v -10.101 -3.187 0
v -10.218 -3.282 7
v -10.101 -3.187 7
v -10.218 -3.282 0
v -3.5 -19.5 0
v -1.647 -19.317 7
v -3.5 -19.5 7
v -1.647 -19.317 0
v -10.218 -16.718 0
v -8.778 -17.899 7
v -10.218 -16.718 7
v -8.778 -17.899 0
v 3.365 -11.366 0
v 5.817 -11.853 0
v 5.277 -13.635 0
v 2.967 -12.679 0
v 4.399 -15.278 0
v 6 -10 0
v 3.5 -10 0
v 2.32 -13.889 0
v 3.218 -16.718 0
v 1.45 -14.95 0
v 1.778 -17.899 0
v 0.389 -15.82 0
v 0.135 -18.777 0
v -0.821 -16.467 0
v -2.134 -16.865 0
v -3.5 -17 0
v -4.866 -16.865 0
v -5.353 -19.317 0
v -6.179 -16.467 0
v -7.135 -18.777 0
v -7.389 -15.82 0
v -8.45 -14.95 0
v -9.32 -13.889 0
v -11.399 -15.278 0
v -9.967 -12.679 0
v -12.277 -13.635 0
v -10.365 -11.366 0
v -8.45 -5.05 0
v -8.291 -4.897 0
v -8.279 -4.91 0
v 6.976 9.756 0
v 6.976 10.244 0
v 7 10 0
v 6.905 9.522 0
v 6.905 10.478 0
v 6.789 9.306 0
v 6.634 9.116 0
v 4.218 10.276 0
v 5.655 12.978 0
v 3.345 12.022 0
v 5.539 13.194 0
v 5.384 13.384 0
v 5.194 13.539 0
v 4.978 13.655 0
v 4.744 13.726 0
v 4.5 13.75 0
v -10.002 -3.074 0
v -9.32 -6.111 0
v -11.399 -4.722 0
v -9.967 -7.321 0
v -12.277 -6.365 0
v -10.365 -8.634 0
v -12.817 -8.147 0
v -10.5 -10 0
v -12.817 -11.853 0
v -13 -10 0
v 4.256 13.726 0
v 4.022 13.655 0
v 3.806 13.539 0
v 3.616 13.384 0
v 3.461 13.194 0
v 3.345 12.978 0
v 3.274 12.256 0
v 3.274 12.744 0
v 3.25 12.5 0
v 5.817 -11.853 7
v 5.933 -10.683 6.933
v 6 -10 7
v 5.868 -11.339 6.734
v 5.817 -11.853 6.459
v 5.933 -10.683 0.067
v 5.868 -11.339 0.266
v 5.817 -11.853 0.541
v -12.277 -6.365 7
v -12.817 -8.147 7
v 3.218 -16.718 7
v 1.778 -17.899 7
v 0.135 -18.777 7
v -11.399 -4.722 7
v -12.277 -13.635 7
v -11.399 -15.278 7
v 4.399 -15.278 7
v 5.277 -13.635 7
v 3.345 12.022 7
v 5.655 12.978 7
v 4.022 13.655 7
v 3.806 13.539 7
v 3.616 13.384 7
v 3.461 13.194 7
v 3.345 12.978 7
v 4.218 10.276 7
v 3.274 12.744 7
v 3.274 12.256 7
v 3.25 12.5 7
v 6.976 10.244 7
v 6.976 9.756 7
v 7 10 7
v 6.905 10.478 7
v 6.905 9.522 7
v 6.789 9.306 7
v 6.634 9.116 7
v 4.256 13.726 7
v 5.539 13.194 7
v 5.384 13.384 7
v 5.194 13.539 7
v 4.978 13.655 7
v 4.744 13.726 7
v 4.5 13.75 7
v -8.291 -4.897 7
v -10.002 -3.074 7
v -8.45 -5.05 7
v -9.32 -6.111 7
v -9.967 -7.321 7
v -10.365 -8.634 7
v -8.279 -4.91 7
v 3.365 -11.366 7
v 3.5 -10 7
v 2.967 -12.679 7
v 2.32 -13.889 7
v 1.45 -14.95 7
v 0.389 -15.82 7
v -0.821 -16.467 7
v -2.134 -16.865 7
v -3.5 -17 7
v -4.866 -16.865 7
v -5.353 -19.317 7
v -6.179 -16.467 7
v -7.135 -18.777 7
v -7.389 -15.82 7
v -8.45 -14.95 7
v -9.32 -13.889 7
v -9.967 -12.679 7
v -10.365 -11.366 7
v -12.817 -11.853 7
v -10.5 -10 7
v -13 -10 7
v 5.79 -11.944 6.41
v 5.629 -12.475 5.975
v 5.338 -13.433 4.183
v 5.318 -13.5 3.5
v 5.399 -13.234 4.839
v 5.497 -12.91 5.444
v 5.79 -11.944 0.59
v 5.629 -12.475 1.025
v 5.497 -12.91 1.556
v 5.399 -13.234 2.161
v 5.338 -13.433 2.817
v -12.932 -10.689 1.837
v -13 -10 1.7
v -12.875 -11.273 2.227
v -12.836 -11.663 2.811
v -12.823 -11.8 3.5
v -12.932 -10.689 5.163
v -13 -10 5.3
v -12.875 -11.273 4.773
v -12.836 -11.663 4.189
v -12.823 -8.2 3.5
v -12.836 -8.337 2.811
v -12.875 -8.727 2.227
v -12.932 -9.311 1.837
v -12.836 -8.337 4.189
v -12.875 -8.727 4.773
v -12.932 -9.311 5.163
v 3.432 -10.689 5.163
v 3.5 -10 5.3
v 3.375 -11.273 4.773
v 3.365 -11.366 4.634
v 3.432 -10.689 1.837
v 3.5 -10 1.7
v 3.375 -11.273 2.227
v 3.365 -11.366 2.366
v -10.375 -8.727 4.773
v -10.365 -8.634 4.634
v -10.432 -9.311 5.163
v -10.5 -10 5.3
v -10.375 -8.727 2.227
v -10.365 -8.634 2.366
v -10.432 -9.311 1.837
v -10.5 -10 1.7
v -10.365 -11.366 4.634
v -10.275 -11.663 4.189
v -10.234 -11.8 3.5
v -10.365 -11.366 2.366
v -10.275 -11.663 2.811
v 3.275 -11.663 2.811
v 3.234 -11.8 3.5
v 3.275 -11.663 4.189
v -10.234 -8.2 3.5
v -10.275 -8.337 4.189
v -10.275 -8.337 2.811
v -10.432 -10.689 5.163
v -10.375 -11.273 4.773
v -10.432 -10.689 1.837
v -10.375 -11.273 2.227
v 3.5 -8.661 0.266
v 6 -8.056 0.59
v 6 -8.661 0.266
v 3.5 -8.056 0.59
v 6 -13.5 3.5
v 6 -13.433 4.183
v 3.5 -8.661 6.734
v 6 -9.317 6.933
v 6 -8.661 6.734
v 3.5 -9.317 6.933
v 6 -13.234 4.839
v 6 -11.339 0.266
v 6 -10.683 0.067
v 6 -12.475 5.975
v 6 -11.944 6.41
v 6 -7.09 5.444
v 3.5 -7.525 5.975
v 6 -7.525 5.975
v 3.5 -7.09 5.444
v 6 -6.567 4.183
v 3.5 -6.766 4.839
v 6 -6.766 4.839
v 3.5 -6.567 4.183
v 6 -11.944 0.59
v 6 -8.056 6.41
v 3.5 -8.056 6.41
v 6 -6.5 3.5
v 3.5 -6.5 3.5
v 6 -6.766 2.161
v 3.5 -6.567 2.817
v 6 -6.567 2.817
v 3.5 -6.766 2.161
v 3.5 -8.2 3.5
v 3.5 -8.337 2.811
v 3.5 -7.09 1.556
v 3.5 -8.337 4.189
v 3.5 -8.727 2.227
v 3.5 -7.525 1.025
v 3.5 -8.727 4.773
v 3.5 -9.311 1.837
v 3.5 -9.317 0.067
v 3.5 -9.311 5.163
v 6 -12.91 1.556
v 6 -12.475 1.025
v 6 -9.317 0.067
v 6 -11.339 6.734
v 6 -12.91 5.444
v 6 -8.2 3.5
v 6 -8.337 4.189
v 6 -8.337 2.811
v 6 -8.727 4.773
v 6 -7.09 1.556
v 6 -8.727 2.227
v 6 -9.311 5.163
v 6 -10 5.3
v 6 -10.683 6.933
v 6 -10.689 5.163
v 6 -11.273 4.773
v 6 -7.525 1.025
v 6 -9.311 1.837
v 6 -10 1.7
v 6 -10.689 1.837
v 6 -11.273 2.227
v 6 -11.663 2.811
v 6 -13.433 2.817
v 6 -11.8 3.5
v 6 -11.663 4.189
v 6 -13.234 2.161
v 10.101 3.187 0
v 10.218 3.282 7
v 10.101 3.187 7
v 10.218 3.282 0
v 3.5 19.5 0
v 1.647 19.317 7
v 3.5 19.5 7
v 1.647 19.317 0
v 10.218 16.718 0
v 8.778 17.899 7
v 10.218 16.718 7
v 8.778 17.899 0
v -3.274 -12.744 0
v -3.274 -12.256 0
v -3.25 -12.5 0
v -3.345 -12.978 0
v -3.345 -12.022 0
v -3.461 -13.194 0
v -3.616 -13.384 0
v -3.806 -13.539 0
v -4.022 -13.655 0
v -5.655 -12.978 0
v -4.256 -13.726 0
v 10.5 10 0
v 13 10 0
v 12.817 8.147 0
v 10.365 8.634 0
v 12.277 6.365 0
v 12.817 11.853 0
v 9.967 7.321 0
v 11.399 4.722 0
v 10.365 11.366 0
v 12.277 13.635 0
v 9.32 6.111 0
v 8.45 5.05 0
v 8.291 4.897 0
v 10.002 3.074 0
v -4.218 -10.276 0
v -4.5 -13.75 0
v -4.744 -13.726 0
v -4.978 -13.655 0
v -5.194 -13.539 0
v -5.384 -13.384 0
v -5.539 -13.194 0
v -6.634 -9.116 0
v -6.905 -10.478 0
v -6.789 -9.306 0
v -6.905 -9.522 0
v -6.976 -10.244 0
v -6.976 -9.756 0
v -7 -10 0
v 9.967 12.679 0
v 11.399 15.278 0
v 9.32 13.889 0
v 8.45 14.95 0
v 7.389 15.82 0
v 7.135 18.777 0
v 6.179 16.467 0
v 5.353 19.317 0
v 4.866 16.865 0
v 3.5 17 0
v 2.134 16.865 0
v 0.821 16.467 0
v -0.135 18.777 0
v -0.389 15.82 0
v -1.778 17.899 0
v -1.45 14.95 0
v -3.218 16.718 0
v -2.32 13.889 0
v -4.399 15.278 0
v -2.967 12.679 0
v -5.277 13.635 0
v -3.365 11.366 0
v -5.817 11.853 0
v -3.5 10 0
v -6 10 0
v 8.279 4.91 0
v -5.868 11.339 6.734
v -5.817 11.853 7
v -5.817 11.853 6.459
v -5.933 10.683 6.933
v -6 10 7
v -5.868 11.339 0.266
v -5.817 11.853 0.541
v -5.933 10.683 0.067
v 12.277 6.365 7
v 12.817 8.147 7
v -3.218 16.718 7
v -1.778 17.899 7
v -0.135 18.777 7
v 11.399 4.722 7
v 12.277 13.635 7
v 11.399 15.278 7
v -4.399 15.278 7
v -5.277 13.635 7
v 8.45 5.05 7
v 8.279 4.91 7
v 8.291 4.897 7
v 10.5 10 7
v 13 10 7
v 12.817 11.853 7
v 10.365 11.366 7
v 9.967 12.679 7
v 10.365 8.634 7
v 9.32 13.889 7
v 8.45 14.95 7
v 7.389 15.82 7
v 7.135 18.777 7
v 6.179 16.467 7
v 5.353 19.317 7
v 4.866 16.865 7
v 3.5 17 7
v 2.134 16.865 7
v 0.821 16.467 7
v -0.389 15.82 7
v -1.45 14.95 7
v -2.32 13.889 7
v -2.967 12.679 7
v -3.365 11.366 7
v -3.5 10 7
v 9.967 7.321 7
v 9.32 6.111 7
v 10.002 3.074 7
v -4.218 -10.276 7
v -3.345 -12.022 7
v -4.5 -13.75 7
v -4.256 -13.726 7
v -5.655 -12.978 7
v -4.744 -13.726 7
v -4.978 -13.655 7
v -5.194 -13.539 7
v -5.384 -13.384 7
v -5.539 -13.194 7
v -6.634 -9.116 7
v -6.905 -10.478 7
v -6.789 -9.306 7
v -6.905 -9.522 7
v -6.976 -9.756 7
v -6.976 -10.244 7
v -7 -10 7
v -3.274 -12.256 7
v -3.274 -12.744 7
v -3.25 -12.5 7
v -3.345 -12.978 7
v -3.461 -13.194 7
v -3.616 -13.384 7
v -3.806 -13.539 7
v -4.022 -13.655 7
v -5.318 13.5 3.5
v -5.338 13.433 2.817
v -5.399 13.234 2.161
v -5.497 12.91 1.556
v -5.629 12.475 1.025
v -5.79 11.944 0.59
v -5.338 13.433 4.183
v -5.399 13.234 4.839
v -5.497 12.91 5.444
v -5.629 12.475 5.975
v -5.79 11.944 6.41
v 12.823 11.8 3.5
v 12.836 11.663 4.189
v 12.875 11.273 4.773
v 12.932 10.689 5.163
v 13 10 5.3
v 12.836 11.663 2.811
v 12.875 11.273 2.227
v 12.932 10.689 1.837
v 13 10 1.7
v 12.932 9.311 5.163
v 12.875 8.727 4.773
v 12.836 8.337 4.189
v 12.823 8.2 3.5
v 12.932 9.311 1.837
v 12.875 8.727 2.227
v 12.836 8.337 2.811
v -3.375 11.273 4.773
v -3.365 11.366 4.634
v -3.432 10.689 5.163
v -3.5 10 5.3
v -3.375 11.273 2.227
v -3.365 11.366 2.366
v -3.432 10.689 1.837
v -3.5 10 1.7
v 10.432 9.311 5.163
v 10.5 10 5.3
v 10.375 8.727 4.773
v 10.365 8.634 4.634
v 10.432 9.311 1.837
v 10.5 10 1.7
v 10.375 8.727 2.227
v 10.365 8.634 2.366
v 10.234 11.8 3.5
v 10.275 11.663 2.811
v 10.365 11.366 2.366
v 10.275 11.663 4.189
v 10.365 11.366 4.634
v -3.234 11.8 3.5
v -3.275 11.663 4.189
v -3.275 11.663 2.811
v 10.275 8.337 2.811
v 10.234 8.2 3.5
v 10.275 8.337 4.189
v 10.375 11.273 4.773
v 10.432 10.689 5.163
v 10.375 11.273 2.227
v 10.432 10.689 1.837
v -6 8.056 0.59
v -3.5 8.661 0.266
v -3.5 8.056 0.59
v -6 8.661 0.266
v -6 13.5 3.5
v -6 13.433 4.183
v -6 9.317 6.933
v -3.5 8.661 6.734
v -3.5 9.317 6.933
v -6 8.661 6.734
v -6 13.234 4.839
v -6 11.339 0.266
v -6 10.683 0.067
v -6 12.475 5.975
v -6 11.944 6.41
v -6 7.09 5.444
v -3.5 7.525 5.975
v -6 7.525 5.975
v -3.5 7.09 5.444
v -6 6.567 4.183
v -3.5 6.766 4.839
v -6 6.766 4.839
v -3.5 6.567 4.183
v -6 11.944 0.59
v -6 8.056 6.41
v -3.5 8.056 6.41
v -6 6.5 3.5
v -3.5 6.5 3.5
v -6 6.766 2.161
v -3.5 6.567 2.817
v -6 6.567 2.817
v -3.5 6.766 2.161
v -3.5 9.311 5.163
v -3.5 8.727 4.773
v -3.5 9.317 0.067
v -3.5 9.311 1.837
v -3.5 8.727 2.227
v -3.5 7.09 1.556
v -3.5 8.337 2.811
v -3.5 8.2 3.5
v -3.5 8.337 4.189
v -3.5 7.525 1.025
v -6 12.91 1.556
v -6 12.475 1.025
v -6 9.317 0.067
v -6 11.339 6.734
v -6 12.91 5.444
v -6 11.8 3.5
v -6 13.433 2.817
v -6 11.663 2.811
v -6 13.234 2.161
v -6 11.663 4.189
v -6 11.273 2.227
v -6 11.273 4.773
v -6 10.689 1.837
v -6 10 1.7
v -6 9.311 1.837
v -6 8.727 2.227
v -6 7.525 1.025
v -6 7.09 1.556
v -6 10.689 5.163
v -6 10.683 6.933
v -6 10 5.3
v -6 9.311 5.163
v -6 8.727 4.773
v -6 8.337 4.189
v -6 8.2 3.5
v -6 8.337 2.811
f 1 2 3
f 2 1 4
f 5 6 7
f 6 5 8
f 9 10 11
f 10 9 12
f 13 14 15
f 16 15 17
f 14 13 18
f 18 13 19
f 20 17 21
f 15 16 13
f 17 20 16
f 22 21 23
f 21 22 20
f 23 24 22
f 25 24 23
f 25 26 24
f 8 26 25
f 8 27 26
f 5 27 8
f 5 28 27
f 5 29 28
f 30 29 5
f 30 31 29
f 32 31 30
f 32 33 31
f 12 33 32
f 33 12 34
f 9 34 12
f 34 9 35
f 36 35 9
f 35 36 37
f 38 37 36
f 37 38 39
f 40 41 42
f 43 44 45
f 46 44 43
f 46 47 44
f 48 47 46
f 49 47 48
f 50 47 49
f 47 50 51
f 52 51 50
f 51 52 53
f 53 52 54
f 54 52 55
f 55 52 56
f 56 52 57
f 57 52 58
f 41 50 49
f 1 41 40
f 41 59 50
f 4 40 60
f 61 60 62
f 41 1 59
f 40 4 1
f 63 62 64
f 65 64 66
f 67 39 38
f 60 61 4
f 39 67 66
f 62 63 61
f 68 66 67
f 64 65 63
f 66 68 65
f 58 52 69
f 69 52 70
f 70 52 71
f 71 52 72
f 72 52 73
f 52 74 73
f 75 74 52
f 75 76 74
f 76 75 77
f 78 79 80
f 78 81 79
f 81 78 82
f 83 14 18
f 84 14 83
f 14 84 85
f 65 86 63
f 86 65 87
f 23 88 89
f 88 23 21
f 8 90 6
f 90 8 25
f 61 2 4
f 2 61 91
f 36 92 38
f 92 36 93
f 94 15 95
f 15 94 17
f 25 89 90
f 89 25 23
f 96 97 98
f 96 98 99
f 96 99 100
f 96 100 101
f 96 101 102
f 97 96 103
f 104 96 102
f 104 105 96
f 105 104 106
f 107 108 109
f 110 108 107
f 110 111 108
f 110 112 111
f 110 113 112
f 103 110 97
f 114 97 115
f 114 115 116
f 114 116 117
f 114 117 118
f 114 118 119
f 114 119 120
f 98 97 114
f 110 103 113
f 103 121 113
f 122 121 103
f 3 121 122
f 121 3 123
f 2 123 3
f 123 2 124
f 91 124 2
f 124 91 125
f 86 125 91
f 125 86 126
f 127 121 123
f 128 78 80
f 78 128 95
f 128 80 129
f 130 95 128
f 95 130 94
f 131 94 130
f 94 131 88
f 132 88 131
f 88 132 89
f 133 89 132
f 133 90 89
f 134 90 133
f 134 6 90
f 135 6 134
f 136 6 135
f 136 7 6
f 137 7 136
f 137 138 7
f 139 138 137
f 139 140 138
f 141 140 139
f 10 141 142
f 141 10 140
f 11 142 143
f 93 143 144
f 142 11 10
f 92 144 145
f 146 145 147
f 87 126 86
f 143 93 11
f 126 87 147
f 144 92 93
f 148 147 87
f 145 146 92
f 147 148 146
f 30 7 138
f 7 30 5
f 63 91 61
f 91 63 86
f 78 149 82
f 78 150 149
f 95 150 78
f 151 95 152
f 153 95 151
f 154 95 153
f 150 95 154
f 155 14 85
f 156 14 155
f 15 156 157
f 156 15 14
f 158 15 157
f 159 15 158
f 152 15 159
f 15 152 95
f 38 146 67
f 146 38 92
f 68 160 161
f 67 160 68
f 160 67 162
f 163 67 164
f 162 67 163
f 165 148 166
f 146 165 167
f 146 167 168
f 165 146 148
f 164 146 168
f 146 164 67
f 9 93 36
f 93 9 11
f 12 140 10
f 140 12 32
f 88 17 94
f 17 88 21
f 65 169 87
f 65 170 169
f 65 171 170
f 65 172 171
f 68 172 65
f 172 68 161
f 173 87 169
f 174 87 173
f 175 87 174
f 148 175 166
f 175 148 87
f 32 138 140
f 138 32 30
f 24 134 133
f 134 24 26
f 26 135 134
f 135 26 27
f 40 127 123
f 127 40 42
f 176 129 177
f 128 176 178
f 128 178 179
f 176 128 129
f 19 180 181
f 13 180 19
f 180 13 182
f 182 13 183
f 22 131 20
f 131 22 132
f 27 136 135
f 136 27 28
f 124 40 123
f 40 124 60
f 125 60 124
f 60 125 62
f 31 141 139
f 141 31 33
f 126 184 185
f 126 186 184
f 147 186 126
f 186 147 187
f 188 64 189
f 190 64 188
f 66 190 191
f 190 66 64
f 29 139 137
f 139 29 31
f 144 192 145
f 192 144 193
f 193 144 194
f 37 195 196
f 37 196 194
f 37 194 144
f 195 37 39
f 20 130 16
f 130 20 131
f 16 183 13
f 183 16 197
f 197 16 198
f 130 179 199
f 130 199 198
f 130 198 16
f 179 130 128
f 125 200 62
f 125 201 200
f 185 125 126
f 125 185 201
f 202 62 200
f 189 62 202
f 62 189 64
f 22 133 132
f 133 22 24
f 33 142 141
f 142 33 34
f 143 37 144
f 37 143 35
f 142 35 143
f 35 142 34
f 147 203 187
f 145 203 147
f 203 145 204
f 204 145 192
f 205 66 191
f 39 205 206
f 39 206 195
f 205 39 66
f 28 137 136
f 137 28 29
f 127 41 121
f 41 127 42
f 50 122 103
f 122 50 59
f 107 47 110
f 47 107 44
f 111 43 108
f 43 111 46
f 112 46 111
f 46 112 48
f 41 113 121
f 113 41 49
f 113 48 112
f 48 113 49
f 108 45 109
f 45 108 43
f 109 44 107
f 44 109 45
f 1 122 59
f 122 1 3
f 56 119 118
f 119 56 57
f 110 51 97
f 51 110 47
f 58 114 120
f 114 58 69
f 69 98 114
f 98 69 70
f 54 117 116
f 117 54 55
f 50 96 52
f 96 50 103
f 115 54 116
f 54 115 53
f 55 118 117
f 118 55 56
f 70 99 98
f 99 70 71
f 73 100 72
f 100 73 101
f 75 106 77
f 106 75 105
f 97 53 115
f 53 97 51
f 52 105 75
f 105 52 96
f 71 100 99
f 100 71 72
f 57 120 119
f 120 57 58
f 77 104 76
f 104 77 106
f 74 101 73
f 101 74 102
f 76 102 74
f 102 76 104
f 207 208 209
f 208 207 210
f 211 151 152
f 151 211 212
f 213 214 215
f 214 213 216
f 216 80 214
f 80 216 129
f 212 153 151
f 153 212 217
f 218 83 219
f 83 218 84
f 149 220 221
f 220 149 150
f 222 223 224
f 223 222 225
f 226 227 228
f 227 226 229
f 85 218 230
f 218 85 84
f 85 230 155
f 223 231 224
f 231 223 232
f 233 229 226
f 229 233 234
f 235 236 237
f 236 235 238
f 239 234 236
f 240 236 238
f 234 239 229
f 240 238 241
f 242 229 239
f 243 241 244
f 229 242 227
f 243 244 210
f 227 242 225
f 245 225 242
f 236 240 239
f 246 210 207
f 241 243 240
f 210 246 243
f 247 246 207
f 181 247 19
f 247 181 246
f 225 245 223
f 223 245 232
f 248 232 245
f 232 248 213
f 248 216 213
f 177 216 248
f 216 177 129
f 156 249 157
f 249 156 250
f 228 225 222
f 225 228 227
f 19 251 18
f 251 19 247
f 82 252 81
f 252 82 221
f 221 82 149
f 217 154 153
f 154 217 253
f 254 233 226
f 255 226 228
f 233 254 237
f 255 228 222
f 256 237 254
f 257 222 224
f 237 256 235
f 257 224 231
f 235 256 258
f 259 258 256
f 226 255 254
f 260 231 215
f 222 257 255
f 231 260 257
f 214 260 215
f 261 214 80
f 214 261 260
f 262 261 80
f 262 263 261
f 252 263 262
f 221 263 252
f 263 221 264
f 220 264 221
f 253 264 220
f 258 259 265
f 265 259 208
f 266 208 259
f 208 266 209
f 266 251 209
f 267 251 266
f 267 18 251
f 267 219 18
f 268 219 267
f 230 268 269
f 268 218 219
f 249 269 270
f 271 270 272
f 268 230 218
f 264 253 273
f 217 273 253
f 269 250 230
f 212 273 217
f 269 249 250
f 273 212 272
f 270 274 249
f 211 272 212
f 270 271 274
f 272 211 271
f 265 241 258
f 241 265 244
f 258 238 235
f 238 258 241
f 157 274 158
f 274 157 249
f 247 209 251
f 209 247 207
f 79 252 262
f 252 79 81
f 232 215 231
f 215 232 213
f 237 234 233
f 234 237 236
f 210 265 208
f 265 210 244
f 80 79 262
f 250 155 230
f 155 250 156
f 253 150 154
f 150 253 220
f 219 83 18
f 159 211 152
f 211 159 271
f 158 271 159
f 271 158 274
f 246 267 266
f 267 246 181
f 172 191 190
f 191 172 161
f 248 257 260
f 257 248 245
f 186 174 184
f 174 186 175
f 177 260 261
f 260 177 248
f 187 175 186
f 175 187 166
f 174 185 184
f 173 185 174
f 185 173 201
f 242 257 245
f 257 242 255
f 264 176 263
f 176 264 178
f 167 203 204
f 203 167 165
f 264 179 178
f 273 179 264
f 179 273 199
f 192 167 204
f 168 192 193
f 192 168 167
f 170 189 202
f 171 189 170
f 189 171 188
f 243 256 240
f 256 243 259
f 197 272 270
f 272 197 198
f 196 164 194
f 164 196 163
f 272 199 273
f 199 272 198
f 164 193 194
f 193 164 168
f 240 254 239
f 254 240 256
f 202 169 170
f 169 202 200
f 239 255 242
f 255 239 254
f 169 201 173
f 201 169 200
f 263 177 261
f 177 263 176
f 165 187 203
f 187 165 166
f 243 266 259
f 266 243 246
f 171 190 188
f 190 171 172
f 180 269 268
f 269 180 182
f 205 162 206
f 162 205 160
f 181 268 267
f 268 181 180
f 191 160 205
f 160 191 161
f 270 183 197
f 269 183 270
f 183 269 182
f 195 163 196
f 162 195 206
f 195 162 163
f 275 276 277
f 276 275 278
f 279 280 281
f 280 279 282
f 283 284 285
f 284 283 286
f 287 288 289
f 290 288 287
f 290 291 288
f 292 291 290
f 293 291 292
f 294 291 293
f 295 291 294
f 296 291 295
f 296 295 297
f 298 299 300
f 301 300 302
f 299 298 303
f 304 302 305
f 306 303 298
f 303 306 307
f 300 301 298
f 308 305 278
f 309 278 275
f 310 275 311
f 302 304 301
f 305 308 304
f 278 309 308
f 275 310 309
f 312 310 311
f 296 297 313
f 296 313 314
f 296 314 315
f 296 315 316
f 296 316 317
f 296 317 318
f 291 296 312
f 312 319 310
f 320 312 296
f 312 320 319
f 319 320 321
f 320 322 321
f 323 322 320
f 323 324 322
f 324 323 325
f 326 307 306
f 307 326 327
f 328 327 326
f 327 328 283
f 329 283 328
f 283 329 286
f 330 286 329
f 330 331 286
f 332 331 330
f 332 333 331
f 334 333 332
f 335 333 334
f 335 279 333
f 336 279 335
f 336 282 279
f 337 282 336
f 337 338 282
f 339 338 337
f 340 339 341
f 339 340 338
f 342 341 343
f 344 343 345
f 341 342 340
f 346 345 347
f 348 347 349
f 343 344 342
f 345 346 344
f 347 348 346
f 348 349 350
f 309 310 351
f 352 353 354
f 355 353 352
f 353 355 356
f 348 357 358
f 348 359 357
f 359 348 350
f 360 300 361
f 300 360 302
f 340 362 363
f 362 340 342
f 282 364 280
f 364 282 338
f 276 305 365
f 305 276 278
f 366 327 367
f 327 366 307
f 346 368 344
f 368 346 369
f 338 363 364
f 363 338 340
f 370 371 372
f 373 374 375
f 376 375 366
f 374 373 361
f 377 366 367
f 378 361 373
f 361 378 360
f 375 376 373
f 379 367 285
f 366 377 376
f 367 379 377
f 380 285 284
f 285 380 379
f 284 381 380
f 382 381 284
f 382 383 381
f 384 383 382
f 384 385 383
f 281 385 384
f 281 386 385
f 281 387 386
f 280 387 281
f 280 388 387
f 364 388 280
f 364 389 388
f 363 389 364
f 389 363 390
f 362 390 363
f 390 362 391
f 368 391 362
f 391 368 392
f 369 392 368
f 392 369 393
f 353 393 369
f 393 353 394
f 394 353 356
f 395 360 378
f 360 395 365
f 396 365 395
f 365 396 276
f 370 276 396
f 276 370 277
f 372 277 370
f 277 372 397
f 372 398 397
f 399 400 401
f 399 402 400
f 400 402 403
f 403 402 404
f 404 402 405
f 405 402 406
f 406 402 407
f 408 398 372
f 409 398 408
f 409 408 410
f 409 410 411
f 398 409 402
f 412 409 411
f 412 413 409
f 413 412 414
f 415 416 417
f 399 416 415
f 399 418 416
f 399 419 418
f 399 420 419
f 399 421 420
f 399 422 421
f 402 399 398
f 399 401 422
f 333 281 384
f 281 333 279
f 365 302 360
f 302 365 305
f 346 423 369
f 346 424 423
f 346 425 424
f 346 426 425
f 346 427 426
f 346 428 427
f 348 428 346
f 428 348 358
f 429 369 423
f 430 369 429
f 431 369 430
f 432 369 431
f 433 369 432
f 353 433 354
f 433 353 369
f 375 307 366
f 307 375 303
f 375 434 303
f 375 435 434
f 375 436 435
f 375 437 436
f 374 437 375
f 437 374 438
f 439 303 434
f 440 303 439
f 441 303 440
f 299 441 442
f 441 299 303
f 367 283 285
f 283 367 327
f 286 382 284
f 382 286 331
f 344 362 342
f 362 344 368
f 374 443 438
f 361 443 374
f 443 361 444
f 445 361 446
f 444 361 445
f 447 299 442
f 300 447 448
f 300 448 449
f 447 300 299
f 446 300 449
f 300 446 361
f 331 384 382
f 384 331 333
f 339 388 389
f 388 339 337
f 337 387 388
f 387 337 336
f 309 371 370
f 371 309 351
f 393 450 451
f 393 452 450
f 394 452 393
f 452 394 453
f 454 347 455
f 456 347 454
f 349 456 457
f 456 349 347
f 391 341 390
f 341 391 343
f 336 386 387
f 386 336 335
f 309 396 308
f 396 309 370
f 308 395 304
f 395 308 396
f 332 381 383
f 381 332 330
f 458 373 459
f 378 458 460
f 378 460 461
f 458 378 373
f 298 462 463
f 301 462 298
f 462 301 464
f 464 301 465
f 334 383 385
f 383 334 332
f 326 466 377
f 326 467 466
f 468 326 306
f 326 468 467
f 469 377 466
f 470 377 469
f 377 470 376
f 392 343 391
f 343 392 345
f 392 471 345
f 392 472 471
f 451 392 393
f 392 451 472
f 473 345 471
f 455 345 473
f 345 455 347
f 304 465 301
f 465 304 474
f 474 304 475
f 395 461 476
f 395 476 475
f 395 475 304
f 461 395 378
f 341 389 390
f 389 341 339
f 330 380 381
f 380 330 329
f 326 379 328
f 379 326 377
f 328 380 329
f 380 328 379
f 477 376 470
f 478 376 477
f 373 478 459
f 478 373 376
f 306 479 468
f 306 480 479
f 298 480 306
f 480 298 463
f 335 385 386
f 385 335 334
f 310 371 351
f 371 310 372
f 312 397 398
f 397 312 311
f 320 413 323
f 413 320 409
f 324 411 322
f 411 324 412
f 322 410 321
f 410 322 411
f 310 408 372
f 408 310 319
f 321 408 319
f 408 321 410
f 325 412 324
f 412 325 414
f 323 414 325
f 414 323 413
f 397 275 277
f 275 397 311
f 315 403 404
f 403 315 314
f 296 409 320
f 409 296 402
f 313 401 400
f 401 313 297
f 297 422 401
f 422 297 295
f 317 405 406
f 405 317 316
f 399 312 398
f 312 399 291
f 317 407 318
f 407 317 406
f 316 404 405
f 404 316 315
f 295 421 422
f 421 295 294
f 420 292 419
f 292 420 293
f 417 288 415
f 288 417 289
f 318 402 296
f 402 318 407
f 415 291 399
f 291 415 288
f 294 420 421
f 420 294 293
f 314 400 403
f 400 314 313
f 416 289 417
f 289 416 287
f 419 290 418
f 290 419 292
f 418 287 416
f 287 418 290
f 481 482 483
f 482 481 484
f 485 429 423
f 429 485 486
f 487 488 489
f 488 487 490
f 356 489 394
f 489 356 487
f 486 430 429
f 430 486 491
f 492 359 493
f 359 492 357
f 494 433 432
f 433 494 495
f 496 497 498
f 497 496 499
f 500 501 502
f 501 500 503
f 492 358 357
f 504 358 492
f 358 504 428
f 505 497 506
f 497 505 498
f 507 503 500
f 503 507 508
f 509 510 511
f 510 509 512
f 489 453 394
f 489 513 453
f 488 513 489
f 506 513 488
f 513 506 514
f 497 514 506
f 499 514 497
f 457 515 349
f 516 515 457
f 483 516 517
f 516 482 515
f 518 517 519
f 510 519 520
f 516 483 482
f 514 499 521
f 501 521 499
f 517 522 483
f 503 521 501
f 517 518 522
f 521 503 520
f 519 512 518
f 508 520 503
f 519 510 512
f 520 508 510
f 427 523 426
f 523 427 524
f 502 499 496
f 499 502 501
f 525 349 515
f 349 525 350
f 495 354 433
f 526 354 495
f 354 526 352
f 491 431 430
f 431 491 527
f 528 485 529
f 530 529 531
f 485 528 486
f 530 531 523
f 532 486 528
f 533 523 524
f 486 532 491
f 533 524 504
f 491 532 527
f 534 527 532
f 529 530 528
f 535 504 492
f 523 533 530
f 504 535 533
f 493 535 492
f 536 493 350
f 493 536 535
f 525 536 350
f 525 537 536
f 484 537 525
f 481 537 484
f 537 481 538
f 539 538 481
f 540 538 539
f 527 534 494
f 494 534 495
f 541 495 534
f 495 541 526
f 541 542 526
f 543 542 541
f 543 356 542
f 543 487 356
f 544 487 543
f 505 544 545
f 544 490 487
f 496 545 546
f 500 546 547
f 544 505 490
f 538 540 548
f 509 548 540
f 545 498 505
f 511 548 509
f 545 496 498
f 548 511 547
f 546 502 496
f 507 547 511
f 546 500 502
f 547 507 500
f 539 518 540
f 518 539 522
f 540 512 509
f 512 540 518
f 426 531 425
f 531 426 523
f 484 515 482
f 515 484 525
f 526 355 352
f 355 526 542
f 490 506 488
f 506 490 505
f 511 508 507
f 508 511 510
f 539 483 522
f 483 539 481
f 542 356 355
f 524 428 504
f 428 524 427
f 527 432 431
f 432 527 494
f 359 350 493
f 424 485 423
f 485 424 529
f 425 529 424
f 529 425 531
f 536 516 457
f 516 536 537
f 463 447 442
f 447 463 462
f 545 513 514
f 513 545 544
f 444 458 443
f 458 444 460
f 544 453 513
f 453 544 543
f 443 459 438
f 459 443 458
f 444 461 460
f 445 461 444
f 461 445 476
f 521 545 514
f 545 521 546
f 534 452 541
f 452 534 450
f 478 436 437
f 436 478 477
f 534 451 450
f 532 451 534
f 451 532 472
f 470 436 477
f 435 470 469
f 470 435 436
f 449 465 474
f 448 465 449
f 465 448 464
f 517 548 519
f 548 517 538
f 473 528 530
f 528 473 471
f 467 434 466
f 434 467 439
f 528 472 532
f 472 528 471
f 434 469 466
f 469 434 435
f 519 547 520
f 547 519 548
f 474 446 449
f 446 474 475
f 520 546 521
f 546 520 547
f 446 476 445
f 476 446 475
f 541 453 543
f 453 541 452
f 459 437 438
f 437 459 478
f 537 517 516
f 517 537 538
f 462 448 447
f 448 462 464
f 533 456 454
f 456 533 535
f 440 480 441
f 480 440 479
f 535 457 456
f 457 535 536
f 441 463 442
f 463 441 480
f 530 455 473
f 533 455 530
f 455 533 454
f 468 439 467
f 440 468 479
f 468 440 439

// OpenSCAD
/******************************************************************
*                                                                 *
* OpenFlexure Microscope: Optics unit                             *
*                                                                 *
* This is part of the OpenFlexure microscope, an open-source      *
* microscope and 3-axis translation stage.  It gets really good   *
* precision over a ~10mm range, by using plastic flexure          *
* mechanisms.                                                     *
*                                                                 *
* (c) Richard Bowman, January 2016                                *
* Released under the CERN Open Hardware License                   *
*                                                                 *
******************************************************************/

use <./libs/utilities.scad>

$fn=32;

module sample_clip(clamp_point, t=2.5, w=6, radius_of_curvature=undef, slope=30){

    default_roc = clamp_point.z/2 + clamp_point.y*sin(slope) - t/2;
    roc = if_undefined_set_default(radius_of_curvature, default_roc);

    //z distance from the contact point to the centre of the curved part
    z_dist = clamp_point.z - roc - t/2;
    //a is the distance from the contact-point cylinder to the
    //centre of the curved part
    a = sqrt(clamp_point.y^2 + z_dist^2);
    //angle through which we must rotate the join between
    angle = acos((roc + t/2) / a) + atan(z_dist/clamp_point.y);


    difference(){
        union(){
            //anchor to stage
            cylinder(r=w/2,h=t);

            translate_z(roc+t){
                rotate_y(90){
                    difference(){
                        cylinder(r=roc+t,h=w,center=true);
                        cylinder(r=roc,h=999,center=true);
                        translate_z(-99){
                            cube([999,999,999]);
                        }
                        translate_z(-99){
                            rotate(angle){
                                cube([999,999,999]);
                            }
                        }
                    }
                }
            }
            sequential_hull(){
                translate_z(roc+t){
                    rotate_y(90){
                        rotate(angle){
                            translate_y(roc+t/2){
                                cylinder(r=t/2,h=w,center=true);
                            }
                        }
                    }
                }
                translate([0,clamp_point.y,clamp_point.z+t/2]){
                    rotate_y(90){
                        cylinder(r=t/2,h=w,center=true);
                    }
                }
                translate([0,clamp_point.y+t,clamp_point.z+t]){
                    rotate_y(90){
                        cylinder(r=t/2,h=w,center=true);
                    }
                }
            }

        }
        cylinder(r=3/2*1.2,h=999,center=true,$fn=16);
    }
}

// TODO make the mini culture plate clips an accessory
//this is for mini culture plates, 39mm outer diameter and 12.4mm high
//sample_clip([0,19/2+3,12.4-1.5],slope=7.5); //mini culture dish

module sample_clips_stl(){
    for(a=[0,180]){
        rotate([0,-90,a]){
            translate([7/2,-10,-7+1]){
                default_sample_clip();
            }
        }
    }
}

// sample clip, upright, with default parameters
module default_sample_clip(){
    sample_clip([0,20,-1], w=7, radius_of_curvature=7);
}

sample_clips_stl();
